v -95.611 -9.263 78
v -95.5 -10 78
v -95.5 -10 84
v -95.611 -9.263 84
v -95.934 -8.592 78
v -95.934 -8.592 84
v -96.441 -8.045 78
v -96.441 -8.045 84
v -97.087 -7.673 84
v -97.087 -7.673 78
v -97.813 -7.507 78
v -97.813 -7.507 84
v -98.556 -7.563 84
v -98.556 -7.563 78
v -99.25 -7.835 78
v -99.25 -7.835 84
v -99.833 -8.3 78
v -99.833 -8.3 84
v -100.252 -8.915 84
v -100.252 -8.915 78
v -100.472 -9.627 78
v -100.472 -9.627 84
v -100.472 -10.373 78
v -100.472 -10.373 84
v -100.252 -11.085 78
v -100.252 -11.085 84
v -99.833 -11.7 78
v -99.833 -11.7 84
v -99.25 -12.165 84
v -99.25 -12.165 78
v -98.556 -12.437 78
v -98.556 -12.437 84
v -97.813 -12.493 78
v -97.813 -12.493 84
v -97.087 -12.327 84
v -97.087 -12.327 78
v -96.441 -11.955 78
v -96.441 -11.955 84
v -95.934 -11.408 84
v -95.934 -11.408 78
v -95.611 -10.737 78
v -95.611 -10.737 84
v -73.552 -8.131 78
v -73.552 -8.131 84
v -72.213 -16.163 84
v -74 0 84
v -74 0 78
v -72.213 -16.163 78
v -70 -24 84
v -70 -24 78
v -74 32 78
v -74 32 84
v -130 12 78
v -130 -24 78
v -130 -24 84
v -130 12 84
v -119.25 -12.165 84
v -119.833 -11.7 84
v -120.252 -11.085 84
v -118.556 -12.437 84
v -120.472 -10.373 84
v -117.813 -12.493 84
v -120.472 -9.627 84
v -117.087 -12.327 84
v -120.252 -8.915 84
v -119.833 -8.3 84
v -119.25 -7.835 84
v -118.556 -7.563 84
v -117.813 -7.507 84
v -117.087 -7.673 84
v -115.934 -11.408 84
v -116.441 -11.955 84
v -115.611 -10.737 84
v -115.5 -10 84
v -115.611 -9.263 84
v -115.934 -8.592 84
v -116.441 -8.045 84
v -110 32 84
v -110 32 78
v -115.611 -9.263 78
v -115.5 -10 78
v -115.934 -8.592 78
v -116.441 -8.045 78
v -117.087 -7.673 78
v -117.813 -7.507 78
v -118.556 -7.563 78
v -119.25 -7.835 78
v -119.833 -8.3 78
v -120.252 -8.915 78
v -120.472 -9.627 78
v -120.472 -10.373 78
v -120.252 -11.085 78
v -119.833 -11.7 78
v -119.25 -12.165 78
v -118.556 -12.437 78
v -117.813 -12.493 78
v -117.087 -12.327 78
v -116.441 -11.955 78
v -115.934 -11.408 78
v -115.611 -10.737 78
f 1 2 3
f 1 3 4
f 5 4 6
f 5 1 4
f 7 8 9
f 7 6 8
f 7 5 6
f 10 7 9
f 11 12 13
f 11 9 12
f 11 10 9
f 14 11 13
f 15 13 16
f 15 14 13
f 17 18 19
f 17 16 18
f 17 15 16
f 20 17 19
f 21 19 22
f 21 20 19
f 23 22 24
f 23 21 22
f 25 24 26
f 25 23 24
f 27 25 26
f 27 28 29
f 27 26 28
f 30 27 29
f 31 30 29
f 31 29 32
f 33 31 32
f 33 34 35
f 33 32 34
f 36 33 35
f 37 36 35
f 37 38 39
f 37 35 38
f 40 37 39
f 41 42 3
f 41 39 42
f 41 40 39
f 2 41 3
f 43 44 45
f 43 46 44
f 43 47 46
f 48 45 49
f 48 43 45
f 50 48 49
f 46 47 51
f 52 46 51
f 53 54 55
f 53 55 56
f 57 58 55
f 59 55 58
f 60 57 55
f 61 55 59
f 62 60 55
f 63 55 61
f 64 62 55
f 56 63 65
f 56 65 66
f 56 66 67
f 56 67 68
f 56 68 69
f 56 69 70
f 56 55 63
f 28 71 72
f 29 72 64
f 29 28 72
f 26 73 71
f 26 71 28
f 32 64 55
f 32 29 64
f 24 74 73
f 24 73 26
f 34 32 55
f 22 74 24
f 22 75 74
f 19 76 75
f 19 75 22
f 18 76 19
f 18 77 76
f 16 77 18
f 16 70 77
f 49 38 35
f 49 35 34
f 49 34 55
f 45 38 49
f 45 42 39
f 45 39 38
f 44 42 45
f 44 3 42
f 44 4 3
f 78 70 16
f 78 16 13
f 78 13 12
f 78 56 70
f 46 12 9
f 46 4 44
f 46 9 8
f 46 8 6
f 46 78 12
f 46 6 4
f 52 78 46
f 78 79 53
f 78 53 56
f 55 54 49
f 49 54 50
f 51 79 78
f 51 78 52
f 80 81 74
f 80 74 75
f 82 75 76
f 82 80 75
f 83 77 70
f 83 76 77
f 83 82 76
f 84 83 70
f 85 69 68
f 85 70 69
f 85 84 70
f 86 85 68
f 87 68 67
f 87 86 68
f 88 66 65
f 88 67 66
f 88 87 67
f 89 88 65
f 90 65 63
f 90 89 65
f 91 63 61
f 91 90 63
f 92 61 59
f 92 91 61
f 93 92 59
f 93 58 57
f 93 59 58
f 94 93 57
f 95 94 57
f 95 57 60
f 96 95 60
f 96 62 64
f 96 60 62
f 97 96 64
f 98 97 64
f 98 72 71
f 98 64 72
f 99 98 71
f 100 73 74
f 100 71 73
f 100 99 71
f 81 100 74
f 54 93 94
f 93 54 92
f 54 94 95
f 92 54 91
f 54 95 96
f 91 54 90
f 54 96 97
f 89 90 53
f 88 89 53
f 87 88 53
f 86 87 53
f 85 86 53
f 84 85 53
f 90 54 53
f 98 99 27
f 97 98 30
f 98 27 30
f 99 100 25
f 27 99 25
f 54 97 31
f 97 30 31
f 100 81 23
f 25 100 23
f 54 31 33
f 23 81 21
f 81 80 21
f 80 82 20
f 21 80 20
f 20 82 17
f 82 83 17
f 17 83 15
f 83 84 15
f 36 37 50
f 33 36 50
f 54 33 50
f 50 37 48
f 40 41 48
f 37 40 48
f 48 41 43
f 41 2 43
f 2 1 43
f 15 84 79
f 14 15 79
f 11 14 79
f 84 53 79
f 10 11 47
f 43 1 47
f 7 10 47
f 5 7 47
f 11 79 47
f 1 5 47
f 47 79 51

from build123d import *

# Parameters (mm, degrees)
BOX763_W           = 148
BOX763_H           = 74
BOX763_DEPTH       = 55
CYLINDER1803_R     = 2.5
CYLINDER1803_DEPTH = 20
CYLINDER1804_R     = 2.5
CYLINDER1804_DEPTH = 20
CYLINDER1802_R     = 74
CYLINDER1802_DEPTH = 32
BOX762_W           = 68
BOX762_H           = 56
BOX762_DEPTH       = 6
CHAMFER063_SIZE    = 20


with BuildPart() as krychle763:
    # Box763 → Box763 (new body)
    with BuildSketch(Plane(origin=(-74, 0, 29), x_dir=(1, 0, 0), z_dir=(0, 0, 1))):
        with Locations((74, 37)):
            Rectangle(BOX763_W, BOX763_H)
    extrude(amount=BOX763_DEPTH)


with BuildPart() as v_lec1803:
    # Cylinder1803 → Cylinder1803 (new body)
    with BuildSketch(Plane(origin=(-90, -10, 66), x_dir=(1, 0, 0), z_dir=(0, 0, 1))):
        Circle(CYLINDER1803_R)
    extrude(amount=CYLINDER1803_DEPTH)


with BuildPart() as compound921:
    # Cylinder1804 → Cylinder1804 (new body)
    with BuildSketch(Plane(origin=(-110, -10, 66), x_dir=(1, 0, 0), z_dir=(0, 0, 1))):
        Circle(CYLINDER1804_R)
    extrude(amount=CYLINDER1804_DEPTH)

    # Compound921: union Válec1803
    add(v_lec1803.part)


with BuildPart() as compound921_1:
    # Compound921 placement: moved
    add(compound921.part.moved(Location((-8, 0, 0))))


with BuildPart() as v_lec1802:
    # Cylinder1802 → Cylinder1802 (new body)
    with BuildSketch(Plane.XY.offset(66)):
        Circle(CYLINDER1802_R)
    extrude(amount=CYLINDER1802_DEPTH)


with BuildPart() as cut566:
    # Box762 → Box762 (new body)
    with BuildSketch(Plane(origin=(-130, -24, 76), x_dir=(1, 0, 0), z_dir=(0, 0, 1))):
        with Locations((34, 28)):
            Rectangle(BOX762_W, BOX762_H)
    extrude(amount=BOX762_DEPTH)

    # Cut561: cut Válec1802
    add(v_lec1802.part, mode=Mode.SUBTRACT)

    # Cut562: cut Compound921
    add(compound921_1.part, mode=Mode.SUBTRACT)


with BuildPart() as cut566_1:
    # Cut562 placement: moved
    add(cut566.part.moved(Location((0, 0, 2))))

    # Chamfer063
    chamfer063_edges = [cut566_1.edges().sort_by_distance(p)[0] for p in [
        (-130, 32, 81),
    ]]
    chamfer(chamfer063_edges, length=CHAMFER063_SIZE)

    # Cut566: cut Krychle763
    add(krychle763.part, mode=Mode.SUBTRACT)


solid = cut566_1.part
